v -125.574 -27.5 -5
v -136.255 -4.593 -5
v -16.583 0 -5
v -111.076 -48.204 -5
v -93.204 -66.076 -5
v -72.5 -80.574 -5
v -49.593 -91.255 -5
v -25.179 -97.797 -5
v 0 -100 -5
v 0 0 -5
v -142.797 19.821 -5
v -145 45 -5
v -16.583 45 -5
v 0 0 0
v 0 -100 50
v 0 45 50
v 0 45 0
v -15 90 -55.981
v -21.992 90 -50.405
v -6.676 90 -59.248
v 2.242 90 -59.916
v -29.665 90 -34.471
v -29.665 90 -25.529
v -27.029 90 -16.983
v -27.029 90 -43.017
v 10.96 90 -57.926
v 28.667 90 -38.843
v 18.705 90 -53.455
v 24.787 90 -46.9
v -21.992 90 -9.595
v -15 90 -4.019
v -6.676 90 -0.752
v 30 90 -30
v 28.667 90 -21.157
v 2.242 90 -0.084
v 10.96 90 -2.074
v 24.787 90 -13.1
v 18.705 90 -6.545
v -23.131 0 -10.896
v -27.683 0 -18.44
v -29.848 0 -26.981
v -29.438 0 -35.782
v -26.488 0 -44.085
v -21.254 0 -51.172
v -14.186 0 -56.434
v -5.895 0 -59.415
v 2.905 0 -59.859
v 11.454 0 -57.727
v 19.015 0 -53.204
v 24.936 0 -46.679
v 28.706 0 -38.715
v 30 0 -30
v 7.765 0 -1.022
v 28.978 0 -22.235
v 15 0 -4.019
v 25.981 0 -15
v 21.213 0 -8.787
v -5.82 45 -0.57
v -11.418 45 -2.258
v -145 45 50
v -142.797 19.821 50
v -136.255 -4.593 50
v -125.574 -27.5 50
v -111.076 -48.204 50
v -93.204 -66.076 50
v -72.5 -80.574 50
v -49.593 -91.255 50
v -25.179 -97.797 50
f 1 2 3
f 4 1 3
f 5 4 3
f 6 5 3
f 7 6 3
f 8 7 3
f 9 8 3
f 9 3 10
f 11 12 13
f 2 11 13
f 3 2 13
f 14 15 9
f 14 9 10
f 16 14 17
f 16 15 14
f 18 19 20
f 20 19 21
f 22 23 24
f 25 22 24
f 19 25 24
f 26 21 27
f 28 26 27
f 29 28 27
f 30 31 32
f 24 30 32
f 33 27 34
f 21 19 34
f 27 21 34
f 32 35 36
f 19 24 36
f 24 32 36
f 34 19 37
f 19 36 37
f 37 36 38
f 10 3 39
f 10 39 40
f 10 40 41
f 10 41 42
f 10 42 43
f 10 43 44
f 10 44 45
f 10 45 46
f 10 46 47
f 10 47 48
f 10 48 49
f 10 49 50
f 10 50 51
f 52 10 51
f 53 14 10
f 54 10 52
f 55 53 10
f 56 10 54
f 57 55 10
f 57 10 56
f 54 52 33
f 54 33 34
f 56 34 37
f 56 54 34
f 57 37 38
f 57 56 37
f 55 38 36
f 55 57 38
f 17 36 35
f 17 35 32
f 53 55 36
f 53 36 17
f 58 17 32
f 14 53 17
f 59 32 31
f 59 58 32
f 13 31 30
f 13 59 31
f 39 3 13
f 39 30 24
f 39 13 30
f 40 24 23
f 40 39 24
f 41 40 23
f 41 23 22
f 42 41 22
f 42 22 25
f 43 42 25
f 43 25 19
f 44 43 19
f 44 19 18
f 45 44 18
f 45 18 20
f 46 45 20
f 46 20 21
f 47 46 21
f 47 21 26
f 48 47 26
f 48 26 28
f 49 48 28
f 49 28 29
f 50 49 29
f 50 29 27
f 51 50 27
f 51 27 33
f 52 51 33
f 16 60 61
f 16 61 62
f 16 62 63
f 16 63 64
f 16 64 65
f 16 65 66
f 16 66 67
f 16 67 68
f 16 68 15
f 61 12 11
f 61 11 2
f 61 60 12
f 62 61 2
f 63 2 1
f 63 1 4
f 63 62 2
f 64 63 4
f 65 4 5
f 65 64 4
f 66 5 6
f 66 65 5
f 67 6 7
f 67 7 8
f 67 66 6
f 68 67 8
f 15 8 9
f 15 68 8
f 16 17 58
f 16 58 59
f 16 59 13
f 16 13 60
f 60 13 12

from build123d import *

# Parameters (mm, degrees)
F0_R          = 30
F1_DEPTH      = 90
F3_DEPTH      = 50
F3_DEPTH_BACK = 5


with BuildPart() as f1:
    # F0 (on Front) → F1 (new body)
    with BuildSketch(Plane.XZ):
        with Locations((0, -30)):
            Circle(F0_R)
    extrude(amount=-F1_DEPTH)

    # F2 (on Top) → F3 (join, two sides)
    with BuildSketch(Plane.XY) as f3_sk:
        with BuildLine():
            Line((0, -100), (0, 45))
            Line((0, 45), (-145, 45))
            ThreePointArc((-145, 45), (-102.530483, -57.530483), (0, -100))
        make_face()
    extrude(amount=F3_DEPTH)
    extrude(f3_sk.sketch, amount=-F3_DEPTH_BACK)


solid = f1.part
